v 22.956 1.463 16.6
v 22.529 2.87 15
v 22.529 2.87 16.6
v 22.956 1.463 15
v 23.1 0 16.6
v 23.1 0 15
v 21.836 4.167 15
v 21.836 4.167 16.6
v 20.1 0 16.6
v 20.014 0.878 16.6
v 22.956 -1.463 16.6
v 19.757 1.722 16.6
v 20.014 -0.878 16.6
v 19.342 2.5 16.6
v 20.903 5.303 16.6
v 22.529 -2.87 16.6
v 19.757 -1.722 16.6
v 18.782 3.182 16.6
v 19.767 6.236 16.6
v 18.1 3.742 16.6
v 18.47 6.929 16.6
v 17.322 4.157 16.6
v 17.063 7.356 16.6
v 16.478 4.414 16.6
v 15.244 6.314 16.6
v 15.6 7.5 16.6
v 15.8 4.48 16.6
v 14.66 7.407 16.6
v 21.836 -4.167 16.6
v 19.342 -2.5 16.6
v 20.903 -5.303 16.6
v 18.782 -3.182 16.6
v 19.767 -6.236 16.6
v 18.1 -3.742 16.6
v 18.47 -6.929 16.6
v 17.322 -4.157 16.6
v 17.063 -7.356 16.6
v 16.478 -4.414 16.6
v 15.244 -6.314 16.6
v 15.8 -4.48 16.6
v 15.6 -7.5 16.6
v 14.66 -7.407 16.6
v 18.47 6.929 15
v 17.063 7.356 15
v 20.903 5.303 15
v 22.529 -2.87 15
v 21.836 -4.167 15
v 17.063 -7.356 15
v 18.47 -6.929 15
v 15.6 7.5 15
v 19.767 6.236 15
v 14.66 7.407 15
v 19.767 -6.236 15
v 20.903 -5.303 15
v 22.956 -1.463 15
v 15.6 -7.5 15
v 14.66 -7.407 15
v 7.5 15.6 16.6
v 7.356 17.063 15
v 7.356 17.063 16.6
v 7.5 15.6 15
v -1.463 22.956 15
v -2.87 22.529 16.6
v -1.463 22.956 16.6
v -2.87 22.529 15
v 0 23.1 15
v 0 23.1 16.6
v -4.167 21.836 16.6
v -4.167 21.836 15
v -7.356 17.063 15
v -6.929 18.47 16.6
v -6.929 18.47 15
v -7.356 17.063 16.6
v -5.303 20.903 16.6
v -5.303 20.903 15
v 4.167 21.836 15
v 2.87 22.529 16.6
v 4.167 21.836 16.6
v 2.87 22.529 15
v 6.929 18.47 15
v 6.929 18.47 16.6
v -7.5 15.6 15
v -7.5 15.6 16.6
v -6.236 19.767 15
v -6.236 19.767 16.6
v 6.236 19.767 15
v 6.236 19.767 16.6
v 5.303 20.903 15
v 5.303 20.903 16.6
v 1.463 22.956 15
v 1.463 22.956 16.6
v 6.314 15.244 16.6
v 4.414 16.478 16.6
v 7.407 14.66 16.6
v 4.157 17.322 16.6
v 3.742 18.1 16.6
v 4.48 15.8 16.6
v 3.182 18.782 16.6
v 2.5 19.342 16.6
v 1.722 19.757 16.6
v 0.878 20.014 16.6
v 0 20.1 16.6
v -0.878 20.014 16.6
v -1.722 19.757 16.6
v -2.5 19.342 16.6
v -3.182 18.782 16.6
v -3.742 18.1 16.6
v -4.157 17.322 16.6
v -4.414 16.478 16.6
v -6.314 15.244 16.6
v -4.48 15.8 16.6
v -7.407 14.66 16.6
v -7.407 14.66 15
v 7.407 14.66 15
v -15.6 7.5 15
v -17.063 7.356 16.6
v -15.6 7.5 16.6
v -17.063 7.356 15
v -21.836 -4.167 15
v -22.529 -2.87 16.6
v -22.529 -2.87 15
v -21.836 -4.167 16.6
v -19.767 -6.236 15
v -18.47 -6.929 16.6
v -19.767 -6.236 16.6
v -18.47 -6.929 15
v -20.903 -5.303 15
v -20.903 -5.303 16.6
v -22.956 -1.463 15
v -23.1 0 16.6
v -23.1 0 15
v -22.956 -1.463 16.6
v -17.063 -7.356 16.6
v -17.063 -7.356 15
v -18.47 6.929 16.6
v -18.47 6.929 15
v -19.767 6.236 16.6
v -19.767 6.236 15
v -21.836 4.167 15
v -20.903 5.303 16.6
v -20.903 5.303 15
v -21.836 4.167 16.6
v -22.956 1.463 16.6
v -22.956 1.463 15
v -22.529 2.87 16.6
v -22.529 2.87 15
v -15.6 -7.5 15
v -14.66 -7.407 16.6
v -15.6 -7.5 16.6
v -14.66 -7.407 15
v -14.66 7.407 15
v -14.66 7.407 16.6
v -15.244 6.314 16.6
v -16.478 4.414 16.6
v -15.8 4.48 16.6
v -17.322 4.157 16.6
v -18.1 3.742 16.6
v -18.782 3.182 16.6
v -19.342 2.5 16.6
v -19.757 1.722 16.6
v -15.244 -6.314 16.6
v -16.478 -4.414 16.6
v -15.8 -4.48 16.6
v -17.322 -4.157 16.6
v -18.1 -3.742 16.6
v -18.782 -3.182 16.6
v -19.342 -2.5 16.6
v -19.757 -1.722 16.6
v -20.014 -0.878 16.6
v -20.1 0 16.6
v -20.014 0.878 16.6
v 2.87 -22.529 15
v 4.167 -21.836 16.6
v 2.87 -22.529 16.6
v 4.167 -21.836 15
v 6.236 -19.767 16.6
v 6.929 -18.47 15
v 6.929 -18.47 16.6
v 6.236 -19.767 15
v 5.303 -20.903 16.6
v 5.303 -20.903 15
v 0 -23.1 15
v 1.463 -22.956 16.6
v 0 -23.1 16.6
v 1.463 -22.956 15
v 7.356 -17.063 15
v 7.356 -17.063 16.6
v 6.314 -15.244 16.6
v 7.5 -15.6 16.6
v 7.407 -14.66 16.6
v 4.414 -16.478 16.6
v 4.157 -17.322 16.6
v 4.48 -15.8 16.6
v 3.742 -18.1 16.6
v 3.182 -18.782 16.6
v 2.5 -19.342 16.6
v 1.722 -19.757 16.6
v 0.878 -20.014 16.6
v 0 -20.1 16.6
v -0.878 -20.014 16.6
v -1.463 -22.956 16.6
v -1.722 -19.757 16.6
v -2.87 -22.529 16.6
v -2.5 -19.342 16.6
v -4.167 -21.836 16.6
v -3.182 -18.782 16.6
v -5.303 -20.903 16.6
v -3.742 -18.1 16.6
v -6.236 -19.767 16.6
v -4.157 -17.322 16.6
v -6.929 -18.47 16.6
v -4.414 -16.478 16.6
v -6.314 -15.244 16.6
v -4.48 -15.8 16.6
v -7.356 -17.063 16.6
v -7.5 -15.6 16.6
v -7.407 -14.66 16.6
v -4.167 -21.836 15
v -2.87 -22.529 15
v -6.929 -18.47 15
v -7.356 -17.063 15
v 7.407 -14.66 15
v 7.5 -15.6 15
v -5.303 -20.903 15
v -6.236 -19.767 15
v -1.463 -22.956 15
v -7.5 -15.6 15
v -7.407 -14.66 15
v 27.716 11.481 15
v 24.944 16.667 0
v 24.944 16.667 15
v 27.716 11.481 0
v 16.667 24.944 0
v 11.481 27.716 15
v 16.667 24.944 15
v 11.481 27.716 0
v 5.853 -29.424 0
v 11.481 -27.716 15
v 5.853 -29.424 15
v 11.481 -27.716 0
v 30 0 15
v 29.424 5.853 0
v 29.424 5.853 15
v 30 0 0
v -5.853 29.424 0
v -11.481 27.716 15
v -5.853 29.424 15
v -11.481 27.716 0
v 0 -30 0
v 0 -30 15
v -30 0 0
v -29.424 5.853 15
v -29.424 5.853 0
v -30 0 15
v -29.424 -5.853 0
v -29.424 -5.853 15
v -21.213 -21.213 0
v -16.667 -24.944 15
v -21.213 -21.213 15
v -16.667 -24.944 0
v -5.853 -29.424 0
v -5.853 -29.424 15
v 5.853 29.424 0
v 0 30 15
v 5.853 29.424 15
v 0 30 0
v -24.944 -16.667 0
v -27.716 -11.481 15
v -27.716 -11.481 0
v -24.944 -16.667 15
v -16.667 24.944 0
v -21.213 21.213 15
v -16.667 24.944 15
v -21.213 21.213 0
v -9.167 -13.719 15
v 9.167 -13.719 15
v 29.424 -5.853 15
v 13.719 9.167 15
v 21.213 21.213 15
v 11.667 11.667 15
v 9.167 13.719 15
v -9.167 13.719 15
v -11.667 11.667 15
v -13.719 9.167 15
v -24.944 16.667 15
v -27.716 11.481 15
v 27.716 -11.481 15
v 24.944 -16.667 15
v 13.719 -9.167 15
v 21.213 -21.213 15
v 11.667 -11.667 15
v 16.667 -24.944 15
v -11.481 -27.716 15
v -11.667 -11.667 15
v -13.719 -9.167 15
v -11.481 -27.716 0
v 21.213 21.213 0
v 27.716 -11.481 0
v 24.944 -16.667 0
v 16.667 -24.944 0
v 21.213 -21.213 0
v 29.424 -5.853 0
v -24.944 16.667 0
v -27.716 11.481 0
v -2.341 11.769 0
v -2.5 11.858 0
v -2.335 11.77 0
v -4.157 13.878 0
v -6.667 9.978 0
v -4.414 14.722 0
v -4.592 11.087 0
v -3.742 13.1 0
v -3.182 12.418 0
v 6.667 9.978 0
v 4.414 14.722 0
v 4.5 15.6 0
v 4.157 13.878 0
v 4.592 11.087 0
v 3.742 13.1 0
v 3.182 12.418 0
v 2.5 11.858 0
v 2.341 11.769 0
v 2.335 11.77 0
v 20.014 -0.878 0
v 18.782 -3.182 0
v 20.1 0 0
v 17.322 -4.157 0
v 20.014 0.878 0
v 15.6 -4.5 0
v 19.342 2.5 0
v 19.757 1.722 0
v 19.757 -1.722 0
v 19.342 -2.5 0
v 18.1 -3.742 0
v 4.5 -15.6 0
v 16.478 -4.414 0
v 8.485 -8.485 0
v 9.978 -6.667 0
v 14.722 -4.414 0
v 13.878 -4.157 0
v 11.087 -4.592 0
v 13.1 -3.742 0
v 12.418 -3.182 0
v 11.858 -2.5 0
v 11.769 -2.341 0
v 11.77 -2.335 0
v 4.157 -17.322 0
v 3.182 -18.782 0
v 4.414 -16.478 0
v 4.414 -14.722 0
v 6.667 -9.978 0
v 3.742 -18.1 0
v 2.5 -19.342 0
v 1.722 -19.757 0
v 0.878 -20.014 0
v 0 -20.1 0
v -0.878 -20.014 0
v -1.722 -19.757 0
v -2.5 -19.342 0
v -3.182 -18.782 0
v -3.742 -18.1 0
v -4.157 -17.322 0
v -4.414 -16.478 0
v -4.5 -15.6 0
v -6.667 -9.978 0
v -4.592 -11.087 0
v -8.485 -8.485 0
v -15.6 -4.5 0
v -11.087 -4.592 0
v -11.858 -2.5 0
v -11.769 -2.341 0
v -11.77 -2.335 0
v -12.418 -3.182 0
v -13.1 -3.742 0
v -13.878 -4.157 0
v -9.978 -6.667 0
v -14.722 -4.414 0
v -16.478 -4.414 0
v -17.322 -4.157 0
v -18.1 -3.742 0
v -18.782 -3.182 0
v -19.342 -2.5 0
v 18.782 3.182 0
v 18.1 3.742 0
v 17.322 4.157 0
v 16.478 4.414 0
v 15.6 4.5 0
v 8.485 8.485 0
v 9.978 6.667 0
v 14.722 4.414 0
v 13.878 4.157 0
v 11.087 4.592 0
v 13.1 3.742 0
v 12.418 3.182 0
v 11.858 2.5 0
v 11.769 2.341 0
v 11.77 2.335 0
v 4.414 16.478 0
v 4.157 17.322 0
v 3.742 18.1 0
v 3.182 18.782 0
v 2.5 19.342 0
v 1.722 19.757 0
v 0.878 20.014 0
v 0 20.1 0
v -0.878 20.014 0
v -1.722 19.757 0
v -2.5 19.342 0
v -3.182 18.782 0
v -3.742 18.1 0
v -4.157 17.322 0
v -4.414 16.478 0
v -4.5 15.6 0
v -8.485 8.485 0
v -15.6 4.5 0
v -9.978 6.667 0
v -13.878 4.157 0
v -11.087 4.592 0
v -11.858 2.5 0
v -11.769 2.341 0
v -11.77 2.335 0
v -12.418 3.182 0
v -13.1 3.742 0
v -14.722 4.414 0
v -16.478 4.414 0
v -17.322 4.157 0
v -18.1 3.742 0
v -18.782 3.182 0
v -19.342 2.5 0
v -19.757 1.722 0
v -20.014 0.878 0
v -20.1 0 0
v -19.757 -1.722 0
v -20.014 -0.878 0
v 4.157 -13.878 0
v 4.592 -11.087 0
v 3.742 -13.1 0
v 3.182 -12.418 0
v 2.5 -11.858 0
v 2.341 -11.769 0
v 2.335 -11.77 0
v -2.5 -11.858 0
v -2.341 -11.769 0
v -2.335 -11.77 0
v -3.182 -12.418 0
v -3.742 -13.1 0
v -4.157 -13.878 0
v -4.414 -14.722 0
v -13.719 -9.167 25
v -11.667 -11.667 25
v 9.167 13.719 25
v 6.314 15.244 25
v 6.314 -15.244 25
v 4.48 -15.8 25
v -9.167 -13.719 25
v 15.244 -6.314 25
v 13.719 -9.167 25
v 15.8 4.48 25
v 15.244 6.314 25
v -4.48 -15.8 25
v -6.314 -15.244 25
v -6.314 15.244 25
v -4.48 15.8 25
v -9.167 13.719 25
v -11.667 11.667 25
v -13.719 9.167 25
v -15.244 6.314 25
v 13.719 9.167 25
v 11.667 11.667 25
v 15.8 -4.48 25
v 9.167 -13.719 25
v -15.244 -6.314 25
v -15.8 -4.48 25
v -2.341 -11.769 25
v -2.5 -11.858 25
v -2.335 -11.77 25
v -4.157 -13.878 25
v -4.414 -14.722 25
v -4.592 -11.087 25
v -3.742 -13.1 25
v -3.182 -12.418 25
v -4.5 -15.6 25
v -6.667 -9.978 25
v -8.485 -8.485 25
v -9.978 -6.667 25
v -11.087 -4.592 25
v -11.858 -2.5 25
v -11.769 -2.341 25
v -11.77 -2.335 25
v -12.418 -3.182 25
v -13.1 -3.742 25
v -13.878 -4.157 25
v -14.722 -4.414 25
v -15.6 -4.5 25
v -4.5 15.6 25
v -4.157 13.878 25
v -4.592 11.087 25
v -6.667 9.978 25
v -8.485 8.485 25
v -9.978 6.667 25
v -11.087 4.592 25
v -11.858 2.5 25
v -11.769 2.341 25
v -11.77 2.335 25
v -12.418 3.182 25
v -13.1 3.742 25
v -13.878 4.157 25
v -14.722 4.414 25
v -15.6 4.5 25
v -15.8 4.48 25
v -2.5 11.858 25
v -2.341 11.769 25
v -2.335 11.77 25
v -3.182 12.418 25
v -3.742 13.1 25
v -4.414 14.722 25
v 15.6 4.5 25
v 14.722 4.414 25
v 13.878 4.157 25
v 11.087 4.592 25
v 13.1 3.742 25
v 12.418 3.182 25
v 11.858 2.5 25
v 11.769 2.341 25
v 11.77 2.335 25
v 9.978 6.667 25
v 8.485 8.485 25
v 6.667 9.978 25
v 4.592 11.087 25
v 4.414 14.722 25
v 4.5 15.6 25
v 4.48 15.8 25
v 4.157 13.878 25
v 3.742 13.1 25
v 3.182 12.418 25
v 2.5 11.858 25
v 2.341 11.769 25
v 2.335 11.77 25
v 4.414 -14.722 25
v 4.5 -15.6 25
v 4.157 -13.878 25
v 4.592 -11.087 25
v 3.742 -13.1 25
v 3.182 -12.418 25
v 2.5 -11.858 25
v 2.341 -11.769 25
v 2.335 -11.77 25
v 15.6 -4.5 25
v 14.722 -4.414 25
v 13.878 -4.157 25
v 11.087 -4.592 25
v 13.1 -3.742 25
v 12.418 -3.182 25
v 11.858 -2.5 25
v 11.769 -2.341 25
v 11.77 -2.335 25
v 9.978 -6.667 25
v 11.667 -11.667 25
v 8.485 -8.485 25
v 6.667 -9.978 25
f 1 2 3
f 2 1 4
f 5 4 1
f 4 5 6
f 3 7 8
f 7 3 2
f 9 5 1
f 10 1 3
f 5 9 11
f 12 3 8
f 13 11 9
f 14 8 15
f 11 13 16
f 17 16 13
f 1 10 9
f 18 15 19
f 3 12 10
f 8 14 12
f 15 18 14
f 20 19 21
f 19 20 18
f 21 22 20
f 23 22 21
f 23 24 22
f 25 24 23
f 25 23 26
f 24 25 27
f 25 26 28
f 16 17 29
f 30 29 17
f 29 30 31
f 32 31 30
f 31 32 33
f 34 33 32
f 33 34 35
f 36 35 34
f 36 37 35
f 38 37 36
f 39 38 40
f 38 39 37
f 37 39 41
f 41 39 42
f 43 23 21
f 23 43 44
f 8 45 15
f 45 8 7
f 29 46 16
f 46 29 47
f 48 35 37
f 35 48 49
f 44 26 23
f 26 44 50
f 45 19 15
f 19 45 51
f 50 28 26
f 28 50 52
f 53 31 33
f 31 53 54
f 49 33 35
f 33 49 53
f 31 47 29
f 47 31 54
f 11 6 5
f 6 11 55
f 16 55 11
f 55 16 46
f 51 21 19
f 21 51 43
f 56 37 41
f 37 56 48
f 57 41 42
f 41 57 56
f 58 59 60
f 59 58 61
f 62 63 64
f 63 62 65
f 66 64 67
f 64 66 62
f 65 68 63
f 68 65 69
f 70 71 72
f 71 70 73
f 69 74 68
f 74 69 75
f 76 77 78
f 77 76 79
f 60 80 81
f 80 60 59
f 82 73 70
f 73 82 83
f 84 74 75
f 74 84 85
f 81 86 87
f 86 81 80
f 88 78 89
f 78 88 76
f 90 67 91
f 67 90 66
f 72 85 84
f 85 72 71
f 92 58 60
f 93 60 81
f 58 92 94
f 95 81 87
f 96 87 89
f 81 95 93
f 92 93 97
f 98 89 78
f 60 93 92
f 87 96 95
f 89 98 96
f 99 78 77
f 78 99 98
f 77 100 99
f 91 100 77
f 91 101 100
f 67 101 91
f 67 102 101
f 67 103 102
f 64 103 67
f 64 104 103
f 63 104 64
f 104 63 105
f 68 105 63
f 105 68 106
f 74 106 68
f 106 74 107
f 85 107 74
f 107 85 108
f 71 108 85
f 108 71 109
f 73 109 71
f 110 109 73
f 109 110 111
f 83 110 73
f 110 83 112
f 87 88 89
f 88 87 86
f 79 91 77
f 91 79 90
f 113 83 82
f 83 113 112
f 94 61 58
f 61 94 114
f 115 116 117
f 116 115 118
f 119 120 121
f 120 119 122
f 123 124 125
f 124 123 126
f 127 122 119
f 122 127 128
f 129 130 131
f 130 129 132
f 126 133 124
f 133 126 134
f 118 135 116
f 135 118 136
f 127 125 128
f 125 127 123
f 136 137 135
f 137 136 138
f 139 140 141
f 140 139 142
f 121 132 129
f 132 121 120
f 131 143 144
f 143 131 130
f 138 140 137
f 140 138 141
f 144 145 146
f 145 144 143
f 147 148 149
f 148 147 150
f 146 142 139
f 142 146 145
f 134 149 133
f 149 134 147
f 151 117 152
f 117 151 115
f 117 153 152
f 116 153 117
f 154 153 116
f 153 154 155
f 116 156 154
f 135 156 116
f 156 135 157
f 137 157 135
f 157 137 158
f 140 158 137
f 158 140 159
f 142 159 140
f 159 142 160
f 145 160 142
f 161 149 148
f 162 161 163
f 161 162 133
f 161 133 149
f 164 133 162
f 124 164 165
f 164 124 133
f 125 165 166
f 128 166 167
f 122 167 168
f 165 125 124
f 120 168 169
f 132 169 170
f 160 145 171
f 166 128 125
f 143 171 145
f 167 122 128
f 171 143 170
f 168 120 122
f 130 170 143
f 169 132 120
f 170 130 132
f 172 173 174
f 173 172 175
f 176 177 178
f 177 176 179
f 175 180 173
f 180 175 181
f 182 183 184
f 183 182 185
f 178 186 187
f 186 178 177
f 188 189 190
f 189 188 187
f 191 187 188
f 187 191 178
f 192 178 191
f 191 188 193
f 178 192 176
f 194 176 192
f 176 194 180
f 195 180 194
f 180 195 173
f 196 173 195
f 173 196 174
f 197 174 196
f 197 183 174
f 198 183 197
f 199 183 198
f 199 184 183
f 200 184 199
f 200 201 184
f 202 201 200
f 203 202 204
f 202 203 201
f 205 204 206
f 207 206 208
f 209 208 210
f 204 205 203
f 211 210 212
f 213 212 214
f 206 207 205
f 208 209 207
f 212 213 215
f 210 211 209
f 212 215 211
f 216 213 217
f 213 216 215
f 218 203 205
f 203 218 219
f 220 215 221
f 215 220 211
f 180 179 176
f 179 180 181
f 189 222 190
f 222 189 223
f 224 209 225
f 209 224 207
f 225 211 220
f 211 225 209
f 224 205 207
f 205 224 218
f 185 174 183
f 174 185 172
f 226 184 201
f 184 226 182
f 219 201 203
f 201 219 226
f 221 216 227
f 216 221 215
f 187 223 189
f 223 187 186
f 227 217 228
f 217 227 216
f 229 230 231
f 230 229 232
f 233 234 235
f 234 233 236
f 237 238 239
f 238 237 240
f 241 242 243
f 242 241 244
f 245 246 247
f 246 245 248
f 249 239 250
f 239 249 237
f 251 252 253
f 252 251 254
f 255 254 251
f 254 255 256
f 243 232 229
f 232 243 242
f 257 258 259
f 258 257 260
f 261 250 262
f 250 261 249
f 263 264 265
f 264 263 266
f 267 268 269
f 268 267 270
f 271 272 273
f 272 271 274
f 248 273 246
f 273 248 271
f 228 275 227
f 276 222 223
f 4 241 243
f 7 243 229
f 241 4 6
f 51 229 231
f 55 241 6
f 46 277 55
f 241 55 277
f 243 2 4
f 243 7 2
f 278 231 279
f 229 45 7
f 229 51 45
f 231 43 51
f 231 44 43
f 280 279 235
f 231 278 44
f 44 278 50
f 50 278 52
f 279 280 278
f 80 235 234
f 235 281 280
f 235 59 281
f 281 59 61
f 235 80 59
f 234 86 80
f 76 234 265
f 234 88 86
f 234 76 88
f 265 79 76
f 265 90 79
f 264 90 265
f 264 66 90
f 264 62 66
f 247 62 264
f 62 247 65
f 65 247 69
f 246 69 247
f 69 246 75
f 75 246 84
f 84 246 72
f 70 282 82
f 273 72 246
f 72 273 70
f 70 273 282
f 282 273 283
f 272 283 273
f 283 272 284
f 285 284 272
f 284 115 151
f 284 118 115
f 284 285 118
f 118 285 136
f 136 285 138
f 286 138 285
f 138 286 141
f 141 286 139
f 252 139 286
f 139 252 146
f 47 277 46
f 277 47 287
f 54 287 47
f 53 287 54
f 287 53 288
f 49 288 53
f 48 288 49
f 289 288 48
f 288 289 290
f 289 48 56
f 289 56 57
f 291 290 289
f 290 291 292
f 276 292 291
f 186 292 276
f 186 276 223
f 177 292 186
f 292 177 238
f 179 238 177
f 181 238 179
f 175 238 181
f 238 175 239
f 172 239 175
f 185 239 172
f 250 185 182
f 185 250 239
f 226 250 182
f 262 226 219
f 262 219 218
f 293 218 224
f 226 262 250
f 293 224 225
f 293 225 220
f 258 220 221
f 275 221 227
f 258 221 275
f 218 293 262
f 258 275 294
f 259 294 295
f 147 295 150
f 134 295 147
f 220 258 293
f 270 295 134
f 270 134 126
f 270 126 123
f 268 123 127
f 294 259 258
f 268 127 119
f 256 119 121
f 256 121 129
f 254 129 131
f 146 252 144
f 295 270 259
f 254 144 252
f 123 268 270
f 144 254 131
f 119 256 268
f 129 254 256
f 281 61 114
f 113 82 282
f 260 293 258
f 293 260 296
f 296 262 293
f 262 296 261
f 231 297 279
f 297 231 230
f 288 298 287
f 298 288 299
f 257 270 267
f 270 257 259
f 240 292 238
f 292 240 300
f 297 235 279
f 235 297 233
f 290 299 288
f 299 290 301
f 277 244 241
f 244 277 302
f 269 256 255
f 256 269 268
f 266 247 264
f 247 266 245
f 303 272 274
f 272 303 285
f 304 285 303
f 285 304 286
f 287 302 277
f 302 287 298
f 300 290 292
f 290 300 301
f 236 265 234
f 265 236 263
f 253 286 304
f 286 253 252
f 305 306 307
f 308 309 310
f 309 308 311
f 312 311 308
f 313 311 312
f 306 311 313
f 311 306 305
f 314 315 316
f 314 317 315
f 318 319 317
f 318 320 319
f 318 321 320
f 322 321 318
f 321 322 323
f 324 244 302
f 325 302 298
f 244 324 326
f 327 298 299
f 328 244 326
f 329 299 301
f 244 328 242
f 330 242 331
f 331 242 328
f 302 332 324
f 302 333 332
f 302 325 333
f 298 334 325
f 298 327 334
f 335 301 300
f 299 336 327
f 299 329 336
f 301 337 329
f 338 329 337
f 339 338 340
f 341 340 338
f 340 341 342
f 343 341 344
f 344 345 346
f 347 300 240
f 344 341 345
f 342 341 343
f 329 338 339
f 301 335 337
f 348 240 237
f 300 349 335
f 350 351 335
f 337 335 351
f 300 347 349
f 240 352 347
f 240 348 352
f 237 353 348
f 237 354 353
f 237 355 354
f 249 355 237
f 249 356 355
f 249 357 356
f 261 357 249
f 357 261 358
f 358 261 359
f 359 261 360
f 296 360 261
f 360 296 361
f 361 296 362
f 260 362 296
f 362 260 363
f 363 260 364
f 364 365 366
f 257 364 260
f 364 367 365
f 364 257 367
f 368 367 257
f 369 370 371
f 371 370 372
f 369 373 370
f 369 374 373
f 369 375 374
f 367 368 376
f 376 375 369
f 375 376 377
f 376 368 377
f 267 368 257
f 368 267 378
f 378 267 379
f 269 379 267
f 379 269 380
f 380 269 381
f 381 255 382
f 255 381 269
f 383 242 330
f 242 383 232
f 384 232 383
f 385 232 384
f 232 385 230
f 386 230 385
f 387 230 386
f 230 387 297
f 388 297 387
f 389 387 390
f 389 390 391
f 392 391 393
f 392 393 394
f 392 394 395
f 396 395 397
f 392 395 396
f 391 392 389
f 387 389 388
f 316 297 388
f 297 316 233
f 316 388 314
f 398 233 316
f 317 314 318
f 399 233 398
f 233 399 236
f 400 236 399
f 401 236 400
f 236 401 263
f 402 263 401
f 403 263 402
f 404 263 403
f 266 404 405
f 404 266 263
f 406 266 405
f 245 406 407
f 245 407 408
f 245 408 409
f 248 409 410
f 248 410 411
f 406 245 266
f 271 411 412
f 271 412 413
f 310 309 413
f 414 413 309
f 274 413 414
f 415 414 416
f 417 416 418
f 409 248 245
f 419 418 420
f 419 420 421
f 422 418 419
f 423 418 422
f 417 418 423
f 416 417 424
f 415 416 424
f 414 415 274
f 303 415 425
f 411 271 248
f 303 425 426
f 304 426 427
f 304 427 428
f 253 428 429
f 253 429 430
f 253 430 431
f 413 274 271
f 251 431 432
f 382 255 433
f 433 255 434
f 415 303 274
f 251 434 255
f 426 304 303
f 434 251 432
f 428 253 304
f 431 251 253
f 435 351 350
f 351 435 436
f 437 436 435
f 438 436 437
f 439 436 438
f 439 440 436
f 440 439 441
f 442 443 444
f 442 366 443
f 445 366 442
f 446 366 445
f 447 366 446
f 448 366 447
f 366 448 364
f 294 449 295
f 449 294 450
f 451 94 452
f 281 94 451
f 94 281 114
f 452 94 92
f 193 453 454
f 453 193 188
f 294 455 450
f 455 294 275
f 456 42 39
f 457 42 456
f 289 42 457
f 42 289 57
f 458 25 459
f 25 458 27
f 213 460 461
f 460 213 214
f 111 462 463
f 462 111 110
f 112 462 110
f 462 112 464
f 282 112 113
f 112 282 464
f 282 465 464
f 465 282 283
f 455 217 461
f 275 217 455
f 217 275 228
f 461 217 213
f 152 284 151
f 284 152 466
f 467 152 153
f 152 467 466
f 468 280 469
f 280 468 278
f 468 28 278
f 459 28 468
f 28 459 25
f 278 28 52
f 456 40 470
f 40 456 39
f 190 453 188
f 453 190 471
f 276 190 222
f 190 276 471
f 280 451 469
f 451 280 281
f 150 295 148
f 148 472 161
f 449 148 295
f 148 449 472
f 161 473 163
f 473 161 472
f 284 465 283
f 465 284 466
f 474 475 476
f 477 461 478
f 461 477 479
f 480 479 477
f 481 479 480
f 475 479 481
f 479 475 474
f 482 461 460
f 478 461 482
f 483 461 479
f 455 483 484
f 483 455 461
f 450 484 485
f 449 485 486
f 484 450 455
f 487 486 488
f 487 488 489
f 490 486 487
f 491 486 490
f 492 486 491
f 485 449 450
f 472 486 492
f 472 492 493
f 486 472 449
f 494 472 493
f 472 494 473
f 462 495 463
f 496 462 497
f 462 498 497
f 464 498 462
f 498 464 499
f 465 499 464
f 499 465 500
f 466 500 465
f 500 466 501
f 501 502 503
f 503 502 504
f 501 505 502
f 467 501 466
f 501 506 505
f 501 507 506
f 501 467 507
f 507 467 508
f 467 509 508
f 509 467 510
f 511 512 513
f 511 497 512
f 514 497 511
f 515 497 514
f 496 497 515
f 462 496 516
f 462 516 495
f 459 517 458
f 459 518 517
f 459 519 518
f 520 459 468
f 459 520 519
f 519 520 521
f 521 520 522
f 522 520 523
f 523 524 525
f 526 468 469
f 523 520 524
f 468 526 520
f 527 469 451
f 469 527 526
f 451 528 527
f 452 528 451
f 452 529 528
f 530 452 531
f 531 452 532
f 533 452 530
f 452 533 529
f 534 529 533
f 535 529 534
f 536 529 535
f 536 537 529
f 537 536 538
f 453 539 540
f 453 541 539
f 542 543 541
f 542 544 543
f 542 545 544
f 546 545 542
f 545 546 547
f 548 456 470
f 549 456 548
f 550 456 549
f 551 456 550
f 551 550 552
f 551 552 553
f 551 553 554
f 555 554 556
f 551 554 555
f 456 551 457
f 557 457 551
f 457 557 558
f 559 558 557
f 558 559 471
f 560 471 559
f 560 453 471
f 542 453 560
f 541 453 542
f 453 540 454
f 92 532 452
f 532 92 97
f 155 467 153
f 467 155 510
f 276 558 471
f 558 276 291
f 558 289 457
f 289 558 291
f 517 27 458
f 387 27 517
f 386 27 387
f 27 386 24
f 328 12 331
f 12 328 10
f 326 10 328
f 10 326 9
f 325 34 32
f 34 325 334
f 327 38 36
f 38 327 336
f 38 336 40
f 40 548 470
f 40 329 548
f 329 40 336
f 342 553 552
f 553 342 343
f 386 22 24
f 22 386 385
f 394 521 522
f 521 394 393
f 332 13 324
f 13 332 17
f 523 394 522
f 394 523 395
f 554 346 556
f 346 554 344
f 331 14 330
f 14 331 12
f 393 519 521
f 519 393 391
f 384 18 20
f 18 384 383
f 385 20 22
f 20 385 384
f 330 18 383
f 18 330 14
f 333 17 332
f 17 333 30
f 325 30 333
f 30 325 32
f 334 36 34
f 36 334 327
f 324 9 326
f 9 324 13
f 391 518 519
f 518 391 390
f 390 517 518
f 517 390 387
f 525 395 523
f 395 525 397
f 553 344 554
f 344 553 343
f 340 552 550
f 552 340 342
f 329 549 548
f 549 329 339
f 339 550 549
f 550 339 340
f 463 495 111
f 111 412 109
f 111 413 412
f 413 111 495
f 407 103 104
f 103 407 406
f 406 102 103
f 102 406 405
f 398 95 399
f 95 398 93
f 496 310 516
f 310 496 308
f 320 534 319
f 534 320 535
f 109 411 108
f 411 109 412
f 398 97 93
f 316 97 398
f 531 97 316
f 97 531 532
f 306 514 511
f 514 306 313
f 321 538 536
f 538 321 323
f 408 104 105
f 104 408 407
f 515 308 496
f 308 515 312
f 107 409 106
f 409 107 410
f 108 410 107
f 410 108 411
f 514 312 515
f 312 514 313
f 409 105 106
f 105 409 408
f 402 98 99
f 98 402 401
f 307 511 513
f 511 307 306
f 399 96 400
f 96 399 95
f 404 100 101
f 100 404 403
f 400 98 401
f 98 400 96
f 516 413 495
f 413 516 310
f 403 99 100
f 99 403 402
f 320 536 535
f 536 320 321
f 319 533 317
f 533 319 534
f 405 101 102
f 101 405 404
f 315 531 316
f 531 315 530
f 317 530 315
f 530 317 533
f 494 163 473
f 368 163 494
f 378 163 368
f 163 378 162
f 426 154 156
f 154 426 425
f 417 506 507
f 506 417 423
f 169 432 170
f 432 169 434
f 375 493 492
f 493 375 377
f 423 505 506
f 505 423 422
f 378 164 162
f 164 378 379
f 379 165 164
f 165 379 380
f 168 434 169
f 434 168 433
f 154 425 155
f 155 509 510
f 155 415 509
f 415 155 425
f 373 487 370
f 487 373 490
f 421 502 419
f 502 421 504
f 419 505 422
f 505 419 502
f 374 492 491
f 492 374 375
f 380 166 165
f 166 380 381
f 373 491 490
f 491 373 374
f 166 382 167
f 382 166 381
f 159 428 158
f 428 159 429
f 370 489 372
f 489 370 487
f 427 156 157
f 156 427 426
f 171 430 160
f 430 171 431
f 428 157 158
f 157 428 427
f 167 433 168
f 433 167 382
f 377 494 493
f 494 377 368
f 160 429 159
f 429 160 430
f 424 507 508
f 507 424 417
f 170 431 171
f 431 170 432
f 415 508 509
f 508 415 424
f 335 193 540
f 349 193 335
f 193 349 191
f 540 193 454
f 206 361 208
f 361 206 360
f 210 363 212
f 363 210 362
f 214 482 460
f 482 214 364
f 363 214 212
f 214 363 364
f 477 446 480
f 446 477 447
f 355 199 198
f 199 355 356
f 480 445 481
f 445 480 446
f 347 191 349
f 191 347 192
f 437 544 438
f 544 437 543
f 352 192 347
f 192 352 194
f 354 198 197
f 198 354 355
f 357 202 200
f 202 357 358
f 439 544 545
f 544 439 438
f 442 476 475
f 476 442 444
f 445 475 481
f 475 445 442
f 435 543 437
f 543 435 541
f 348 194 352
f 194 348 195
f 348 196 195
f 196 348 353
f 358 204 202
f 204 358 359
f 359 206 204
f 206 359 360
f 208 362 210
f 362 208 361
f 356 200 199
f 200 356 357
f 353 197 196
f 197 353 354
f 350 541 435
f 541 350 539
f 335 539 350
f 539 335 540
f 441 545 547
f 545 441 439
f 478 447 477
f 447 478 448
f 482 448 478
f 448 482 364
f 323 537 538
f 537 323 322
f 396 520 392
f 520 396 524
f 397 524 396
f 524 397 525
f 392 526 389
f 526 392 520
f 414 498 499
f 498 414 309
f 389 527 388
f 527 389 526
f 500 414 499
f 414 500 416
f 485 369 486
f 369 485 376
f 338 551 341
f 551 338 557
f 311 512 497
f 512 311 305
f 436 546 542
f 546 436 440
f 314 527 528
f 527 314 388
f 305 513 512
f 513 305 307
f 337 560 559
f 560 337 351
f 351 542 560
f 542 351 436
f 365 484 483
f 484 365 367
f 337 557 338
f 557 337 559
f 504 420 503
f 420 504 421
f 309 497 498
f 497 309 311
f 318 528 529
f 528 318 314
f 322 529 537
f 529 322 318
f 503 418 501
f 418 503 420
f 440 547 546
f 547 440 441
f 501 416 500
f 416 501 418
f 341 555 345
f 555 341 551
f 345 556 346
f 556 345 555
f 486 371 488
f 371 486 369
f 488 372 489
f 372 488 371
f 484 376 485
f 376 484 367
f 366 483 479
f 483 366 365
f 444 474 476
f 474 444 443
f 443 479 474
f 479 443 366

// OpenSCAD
$fn = 32;

// ----------------------------------------------------------------------
// Bolt-circle flange: 60 mm outside, 4 bolt holes, bore 24 mm
// ----------------------------------------------------------------------

// --- parameters (mm) ---
flange_d = 60;            // flange outside diameter
flange_t = 15;            // flange thickness
bolts = 4;                // number of bolt holes
bolt_d = 9;               // bolt clearance
bolt_r = 15.6;            // bolt circle radius
bore_d = 24;              // centre bore
hub_d = 33;               // raised hub diameter
hub_h = 10;               // raised hub height
spot_d = 15;              // spot faced bosses
spot_h = 1.6;             // spot face height

module body() {
  cylinder(h = flange_t, d = flange_d);
  /* raised hub, sunk 1 mm into the flange */
  translate([0, 0, flange_t - 1]) cylinder(h = hub_h + 1, d = hub_d);
  /* spot faced pads under the bolt heads */
  for (i = [0 : bolts - 1]) rotate([0, 0, i * 360 / bolts]) translate([bolt_r, 0, flange_t - 1]) cylinder(h = spot_h + 1, d = spot_d);
}

difference() {
  body();
  /* bolt circle */
  for (i = [0 : bolts - 1]) rotate([0, 0, i * 360 / bolts]) translate([bolt_r, 0, -1]) cylinder(h = flange_t + hub_h + 3, d = bolt_d);
  translate([0, 0, -1]) cylinder(h = flange_t + hub_h + 3, d = bore_d);
}
